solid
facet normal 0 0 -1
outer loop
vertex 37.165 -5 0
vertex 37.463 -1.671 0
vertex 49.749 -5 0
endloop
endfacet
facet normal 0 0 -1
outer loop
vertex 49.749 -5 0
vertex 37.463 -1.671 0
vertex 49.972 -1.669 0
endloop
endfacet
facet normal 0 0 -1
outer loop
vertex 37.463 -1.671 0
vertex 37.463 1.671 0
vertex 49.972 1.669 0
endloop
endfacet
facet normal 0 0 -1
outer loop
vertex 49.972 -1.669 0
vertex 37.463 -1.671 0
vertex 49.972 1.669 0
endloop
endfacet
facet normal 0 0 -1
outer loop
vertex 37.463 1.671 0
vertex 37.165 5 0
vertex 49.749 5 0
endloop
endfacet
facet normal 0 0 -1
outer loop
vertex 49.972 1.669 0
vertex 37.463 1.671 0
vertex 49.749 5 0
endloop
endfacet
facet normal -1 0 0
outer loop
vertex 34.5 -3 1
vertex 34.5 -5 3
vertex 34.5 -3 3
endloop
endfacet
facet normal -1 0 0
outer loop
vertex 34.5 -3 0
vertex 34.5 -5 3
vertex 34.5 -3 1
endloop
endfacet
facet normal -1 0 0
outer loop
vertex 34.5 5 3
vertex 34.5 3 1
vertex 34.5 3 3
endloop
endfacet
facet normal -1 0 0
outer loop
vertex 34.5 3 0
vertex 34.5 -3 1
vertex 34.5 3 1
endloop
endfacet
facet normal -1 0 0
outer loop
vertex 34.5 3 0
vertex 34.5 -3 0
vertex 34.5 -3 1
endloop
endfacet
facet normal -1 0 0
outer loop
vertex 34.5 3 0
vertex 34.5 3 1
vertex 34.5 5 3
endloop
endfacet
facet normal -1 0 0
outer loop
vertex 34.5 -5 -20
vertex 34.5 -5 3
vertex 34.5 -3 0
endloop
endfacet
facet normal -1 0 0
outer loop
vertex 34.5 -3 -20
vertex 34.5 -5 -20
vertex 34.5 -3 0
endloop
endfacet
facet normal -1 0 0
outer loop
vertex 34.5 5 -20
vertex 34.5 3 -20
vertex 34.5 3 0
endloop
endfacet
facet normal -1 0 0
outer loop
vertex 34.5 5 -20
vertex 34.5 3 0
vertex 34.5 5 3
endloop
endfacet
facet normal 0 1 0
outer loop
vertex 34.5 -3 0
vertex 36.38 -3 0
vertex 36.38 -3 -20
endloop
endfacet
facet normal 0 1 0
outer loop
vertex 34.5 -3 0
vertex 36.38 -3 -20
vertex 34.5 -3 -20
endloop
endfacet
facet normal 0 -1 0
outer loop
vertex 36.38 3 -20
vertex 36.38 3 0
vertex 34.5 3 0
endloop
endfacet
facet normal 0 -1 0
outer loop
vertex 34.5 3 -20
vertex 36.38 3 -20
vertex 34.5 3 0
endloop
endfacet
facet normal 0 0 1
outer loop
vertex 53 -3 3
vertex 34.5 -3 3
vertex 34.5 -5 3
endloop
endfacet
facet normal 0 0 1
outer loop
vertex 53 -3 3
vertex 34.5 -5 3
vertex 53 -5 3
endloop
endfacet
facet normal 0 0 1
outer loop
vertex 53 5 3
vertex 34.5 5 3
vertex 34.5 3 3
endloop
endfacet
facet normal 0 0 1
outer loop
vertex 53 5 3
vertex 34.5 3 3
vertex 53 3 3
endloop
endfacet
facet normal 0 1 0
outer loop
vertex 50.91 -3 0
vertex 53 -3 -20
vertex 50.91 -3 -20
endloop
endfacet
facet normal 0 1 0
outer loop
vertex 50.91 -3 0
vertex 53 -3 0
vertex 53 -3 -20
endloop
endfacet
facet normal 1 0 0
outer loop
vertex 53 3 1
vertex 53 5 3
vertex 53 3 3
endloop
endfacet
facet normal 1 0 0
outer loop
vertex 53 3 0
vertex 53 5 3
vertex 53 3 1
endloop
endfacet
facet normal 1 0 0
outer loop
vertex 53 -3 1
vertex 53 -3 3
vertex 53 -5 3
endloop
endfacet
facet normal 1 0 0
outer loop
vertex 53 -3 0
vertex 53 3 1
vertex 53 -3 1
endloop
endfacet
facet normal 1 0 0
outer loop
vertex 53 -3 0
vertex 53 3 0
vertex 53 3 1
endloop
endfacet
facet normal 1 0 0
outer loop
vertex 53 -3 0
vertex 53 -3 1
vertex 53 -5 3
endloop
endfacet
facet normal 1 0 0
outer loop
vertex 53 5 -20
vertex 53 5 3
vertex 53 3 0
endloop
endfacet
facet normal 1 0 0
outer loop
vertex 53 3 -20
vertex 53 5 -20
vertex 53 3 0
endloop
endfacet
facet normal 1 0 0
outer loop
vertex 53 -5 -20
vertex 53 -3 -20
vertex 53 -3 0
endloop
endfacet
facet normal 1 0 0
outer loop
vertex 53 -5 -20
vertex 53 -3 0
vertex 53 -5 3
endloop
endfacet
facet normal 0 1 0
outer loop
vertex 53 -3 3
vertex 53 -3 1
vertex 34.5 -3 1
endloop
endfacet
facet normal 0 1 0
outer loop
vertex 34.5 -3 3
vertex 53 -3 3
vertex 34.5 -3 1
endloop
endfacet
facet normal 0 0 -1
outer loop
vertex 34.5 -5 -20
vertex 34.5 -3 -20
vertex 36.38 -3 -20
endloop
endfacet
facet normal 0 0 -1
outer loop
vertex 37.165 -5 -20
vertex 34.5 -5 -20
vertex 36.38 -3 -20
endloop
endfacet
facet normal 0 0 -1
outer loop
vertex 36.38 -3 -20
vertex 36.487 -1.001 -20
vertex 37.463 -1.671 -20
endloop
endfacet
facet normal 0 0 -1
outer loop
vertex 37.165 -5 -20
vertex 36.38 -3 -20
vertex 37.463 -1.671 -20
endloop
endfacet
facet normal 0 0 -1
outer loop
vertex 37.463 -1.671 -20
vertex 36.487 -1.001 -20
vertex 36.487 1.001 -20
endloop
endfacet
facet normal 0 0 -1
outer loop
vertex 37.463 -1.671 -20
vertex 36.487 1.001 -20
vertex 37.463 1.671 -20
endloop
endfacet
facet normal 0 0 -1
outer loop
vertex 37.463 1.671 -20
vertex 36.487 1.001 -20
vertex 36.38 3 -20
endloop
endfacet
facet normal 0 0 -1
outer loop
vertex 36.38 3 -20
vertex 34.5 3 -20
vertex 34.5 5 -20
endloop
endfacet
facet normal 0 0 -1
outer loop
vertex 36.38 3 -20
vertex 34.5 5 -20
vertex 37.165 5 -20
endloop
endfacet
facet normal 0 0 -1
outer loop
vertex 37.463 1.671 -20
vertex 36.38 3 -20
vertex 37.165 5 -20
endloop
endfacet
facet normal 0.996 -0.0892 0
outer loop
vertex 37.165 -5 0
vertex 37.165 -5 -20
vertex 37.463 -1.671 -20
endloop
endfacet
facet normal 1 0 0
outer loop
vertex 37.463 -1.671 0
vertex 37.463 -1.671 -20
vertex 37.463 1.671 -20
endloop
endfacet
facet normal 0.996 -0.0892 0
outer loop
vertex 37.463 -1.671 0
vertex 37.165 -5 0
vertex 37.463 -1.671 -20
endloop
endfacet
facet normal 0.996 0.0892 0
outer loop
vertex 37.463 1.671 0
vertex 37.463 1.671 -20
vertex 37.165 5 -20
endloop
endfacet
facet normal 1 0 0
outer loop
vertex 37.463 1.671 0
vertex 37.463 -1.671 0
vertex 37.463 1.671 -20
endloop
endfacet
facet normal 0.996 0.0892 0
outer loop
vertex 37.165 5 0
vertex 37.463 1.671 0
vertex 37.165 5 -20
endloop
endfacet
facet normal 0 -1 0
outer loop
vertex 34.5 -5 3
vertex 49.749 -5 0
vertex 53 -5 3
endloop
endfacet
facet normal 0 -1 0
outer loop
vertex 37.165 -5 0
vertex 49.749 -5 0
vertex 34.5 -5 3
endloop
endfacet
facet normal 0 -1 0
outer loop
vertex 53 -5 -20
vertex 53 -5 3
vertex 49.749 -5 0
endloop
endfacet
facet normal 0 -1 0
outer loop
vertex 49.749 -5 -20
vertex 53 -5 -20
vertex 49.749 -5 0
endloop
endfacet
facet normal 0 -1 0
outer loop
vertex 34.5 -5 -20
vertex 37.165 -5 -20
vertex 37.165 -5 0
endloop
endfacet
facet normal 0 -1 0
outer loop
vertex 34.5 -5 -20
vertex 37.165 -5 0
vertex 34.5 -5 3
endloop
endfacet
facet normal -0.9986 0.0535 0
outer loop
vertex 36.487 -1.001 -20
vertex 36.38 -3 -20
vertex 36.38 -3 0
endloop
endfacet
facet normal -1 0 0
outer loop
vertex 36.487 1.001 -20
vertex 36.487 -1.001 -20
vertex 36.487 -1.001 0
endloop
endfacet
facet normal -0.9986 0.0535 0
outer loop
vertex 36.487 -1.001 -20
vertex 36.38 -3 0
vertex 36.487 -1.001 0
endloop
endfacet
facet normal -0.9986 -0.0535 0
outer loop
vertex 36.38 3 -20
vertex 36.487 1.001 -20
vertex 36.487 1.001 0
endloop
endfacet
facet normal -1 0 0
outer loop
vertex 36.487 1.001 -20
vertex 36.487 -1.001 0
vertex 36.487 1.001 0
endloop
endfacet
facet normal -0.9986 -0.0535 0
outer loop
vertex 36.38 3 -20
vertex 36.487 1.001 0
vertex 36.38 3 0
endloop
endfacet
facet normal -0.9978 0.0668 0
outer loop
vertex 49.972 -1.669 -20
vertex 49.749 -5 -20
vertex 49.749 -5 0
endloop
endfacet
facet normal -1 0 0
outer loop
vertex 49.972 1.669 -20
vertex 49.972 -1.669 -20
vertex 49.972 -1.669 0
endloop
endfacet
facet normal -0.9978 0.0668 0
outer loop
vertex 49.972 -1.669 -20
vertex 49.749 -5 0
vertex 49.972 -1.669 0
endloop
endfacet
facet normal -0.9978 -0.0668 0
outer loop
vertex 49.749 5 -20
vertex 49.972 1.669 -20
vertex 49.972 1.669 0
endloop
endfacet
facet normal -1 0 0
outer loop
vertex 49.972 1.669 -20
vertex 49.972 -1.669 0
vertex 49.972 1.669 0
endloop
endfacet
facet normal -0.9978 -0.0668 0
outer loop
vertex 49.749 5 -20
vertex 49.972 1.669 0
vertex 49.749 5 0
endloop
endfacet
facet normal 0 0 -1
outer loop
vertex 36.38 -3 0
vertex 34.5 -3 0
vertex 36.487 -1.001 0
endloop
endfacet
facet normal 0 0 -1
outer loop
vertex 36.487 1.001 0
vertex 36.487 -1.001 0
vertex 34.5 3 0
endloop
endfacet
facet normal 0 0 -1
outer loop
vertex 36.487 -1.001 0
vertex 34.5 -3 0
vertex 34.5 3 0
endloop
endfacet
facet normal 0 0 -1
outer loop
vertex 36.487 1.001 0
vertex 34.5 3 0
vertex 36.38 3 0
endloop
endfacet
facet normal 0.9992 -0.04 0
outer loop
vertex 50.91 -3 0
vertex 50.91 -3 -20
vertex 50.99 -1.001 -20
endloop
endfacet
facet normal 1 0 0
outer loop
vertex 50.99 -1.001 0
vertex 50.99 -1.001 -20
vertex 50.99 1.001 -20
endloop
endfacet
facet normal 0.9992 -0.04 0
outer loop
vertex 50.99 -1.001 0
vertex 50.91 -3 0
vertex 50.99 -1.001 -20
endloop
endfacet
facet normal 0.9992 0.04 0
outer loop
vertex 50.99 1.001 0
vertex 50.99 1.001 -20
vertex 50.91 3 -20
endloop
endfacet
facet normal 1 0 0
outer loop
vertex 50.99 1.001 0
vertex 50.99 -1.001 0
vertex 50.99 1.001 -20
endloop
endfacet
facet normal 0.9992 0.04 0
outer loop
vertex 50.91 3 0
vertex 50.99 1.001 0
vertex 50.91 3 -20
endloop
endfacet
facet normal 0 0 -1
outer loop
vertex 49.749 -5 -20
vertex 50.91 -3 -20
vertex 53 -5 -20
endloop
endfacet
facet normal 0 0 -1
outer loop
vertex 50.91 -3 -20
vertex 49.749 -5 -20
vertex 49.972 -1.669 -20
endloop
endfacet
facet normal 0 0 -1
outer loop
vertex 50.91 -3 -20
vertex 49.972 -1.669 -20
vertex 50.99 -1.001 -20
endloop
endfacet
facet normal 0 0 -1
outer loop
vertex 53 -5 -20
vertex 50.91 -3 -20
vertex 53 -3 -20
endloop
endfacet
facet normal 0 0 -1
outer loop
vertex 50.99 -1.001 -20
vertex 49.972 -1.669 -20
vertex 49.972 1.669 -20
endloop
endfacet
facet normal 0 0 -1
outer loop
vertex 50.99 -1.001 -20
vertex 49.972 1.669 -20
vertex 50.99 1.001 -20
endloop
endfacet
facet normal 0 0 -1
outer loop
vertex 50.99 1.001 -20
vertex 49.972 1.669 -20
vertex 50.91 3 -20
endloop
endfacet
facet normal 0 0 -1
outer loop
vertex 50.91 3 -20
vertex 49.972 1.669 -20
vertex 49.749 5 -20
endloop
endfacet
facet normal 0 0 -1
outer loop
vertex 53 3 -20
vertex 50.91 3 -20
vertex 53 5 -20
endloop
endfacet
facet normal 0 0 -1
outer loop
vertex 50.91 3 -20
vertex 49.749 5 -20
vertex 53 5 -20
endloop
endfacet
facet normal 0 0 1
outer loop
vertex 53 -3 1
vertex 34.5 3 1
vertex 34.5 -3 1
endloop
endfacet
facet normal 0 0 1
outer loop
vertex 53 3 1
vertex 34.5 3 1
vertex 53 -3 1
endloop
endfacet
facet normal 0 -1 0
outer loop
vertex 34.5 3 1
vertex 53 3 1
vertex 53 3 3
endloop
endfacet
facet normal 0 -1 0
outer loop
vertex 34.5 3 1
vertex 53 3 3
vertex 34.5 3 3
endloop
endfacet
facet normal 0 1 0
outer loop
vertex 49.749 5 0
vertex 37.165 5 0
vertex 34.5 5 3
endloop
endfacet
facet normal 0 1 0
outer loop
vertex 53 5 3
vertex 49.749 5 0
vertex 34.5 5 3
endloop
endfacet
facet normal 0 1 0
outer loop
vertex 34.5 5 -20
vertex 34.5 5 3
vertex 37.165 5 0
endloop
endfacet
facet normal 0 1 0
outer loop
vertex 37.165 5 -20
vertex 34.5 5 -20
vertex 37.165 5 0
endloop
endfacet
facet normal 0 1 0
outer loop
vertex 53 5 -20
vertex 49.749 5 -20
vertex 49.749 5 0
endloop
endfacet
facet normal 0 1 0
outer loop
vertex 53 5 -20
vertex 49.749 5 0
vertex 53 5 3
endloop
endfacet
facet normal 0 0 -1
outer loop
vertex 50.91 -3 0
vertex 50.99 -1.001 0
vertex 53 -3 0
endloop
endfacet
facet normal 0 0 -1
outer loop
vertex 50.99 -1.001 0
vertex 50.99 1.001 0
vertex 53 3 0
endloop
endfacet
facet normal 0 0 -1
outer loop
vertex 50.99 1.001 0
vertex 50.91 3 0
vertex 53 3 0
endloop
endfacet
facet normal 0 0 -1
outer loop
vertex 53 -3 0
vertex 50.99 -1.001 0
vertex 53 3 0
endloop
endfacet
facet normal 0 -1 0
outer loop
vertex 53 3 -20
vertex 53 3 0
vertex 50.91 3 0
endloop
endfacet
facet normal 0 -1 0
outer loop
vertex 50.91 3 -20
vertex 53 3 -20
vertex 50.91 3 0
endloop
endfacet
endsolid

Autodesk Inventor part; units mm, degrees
ref_plane "YZ Plane" through (0, 0, 0) normal (1, 0, 0) x (0, 1, 0)
ref_plane "XZ Plane" through (0, 0, 0) normal (0, 1, 0) x (-1, 0, 0)
ref_plane "XY Plane" through (0, 0, 0) normal (0, 0, 1) x (1, 0, 0)
sketch "Sketch1" plane through (0, 0, 0) normal (0, 0, 1) x (1, 0, 0)
  line L0 (0, 0) -> (50, 0) construction
  line L1 (0, 0) -> (37.5, 0)
  line L2 (37.5, 0) -> (34.5, 0)
  line L3 (34.5, 0) -> (34.5, 5)
  line L4 (34.5, 5) -> (53, 5)
  line L5 (53, 5) -> (53, -5)
  line L6 (53, -5) -> (34.5, -5)
  line L7 (34.5, -5) -> (34.5, 5)
  line L8 (0, 0) -> (37.1652, 5) construction
  line L9 (0, 0) -> (37.1652, -5) construction
  arc A0 (37.1652, -5) -> (37.1652, 5) centre (0, 0) ccw
  line L10 (0, 0) -> (49.7494, 5) construction
  arc A1 (49.7494, -5) -> (49.7494, 5) centre (0, 0) ccw
  line L11 (34.5, -5) -> (53, -5)
  line L12 (53, -5) -> (53, -3)
  line L13 (53, -3) -> (34.5, -3)
  line L14 (34.5, -3) -> (34.5, -5)
  line L15 (34.5, 5) -> (53, 5)
  line L16 (53, 5) -> (53, 3)
  line L17 (53, 3) -> (34.5, 3)
  line L18 (34.5, 3) -> (34.5, 5)
  line L19 (37.1652, -5) -> (36.1652, -5)
  arc A2 (36.1652, -5) -> (36.1652, 5) centre (-1, 0) ccw
  line L20 (49.7494, -5) -> (50.7494, -5)
  arc A3 (50.7494, -5) -> (50.7494, 5) centre (1, 0) ccw
  point P0 (36.3798, 3)
  point P1 (36.3798, -3)
  point P2 (50.9099, -3)
  point P3 (50.9099, 3)
  dimension "d7" = 50
  dimension "d8" = 37.5
  dimension "d9" = 3
  dimension "d10" = 5
  dimension "d11" = 18.5
  dimension "d12" = 10
  dimension "d13" = 37.5
  dimension "d14" = 50
  dimension "d15" = 2
  dimension "d16" = 2
  dimension "d17" = 1
  dimension "d18" = 1
extrude "Extrusion1" add sketch "Sketch1" along normal blind 1
extrude "Extrusion2" add sketch "Sketch1" along normal blind 3 contours L3 L4 A2 L17 | L13 A2 L6 L7 | L13 A0 L6 A2 | A2 L4 A0 L17 | L13 A1 L6 A0 | A0 L4 A1 L17 | L13 A3 L6 A1 | A1 L4 A3 L17 | L13 L5 L6 A3 | A3 L4 L5 L17
extrude "Extrusion3" add sketch "Sketch1" against normal blind 20 contours A2 L17 A0 L1 | L1 A0 L13 A2 | L3 L4 A2 L17 | L13 A2 L6 L7 | L13 A0 L6 A2 | A2 L4 A0 L17 | L13 A3 L6 A1 | A1 L17 A3 L13 | A1 L4 A3 L17 | L13 L5 L6 A3 | A3 L4 L5 L17
properties part number "Coils" material "Stainless Steel"
